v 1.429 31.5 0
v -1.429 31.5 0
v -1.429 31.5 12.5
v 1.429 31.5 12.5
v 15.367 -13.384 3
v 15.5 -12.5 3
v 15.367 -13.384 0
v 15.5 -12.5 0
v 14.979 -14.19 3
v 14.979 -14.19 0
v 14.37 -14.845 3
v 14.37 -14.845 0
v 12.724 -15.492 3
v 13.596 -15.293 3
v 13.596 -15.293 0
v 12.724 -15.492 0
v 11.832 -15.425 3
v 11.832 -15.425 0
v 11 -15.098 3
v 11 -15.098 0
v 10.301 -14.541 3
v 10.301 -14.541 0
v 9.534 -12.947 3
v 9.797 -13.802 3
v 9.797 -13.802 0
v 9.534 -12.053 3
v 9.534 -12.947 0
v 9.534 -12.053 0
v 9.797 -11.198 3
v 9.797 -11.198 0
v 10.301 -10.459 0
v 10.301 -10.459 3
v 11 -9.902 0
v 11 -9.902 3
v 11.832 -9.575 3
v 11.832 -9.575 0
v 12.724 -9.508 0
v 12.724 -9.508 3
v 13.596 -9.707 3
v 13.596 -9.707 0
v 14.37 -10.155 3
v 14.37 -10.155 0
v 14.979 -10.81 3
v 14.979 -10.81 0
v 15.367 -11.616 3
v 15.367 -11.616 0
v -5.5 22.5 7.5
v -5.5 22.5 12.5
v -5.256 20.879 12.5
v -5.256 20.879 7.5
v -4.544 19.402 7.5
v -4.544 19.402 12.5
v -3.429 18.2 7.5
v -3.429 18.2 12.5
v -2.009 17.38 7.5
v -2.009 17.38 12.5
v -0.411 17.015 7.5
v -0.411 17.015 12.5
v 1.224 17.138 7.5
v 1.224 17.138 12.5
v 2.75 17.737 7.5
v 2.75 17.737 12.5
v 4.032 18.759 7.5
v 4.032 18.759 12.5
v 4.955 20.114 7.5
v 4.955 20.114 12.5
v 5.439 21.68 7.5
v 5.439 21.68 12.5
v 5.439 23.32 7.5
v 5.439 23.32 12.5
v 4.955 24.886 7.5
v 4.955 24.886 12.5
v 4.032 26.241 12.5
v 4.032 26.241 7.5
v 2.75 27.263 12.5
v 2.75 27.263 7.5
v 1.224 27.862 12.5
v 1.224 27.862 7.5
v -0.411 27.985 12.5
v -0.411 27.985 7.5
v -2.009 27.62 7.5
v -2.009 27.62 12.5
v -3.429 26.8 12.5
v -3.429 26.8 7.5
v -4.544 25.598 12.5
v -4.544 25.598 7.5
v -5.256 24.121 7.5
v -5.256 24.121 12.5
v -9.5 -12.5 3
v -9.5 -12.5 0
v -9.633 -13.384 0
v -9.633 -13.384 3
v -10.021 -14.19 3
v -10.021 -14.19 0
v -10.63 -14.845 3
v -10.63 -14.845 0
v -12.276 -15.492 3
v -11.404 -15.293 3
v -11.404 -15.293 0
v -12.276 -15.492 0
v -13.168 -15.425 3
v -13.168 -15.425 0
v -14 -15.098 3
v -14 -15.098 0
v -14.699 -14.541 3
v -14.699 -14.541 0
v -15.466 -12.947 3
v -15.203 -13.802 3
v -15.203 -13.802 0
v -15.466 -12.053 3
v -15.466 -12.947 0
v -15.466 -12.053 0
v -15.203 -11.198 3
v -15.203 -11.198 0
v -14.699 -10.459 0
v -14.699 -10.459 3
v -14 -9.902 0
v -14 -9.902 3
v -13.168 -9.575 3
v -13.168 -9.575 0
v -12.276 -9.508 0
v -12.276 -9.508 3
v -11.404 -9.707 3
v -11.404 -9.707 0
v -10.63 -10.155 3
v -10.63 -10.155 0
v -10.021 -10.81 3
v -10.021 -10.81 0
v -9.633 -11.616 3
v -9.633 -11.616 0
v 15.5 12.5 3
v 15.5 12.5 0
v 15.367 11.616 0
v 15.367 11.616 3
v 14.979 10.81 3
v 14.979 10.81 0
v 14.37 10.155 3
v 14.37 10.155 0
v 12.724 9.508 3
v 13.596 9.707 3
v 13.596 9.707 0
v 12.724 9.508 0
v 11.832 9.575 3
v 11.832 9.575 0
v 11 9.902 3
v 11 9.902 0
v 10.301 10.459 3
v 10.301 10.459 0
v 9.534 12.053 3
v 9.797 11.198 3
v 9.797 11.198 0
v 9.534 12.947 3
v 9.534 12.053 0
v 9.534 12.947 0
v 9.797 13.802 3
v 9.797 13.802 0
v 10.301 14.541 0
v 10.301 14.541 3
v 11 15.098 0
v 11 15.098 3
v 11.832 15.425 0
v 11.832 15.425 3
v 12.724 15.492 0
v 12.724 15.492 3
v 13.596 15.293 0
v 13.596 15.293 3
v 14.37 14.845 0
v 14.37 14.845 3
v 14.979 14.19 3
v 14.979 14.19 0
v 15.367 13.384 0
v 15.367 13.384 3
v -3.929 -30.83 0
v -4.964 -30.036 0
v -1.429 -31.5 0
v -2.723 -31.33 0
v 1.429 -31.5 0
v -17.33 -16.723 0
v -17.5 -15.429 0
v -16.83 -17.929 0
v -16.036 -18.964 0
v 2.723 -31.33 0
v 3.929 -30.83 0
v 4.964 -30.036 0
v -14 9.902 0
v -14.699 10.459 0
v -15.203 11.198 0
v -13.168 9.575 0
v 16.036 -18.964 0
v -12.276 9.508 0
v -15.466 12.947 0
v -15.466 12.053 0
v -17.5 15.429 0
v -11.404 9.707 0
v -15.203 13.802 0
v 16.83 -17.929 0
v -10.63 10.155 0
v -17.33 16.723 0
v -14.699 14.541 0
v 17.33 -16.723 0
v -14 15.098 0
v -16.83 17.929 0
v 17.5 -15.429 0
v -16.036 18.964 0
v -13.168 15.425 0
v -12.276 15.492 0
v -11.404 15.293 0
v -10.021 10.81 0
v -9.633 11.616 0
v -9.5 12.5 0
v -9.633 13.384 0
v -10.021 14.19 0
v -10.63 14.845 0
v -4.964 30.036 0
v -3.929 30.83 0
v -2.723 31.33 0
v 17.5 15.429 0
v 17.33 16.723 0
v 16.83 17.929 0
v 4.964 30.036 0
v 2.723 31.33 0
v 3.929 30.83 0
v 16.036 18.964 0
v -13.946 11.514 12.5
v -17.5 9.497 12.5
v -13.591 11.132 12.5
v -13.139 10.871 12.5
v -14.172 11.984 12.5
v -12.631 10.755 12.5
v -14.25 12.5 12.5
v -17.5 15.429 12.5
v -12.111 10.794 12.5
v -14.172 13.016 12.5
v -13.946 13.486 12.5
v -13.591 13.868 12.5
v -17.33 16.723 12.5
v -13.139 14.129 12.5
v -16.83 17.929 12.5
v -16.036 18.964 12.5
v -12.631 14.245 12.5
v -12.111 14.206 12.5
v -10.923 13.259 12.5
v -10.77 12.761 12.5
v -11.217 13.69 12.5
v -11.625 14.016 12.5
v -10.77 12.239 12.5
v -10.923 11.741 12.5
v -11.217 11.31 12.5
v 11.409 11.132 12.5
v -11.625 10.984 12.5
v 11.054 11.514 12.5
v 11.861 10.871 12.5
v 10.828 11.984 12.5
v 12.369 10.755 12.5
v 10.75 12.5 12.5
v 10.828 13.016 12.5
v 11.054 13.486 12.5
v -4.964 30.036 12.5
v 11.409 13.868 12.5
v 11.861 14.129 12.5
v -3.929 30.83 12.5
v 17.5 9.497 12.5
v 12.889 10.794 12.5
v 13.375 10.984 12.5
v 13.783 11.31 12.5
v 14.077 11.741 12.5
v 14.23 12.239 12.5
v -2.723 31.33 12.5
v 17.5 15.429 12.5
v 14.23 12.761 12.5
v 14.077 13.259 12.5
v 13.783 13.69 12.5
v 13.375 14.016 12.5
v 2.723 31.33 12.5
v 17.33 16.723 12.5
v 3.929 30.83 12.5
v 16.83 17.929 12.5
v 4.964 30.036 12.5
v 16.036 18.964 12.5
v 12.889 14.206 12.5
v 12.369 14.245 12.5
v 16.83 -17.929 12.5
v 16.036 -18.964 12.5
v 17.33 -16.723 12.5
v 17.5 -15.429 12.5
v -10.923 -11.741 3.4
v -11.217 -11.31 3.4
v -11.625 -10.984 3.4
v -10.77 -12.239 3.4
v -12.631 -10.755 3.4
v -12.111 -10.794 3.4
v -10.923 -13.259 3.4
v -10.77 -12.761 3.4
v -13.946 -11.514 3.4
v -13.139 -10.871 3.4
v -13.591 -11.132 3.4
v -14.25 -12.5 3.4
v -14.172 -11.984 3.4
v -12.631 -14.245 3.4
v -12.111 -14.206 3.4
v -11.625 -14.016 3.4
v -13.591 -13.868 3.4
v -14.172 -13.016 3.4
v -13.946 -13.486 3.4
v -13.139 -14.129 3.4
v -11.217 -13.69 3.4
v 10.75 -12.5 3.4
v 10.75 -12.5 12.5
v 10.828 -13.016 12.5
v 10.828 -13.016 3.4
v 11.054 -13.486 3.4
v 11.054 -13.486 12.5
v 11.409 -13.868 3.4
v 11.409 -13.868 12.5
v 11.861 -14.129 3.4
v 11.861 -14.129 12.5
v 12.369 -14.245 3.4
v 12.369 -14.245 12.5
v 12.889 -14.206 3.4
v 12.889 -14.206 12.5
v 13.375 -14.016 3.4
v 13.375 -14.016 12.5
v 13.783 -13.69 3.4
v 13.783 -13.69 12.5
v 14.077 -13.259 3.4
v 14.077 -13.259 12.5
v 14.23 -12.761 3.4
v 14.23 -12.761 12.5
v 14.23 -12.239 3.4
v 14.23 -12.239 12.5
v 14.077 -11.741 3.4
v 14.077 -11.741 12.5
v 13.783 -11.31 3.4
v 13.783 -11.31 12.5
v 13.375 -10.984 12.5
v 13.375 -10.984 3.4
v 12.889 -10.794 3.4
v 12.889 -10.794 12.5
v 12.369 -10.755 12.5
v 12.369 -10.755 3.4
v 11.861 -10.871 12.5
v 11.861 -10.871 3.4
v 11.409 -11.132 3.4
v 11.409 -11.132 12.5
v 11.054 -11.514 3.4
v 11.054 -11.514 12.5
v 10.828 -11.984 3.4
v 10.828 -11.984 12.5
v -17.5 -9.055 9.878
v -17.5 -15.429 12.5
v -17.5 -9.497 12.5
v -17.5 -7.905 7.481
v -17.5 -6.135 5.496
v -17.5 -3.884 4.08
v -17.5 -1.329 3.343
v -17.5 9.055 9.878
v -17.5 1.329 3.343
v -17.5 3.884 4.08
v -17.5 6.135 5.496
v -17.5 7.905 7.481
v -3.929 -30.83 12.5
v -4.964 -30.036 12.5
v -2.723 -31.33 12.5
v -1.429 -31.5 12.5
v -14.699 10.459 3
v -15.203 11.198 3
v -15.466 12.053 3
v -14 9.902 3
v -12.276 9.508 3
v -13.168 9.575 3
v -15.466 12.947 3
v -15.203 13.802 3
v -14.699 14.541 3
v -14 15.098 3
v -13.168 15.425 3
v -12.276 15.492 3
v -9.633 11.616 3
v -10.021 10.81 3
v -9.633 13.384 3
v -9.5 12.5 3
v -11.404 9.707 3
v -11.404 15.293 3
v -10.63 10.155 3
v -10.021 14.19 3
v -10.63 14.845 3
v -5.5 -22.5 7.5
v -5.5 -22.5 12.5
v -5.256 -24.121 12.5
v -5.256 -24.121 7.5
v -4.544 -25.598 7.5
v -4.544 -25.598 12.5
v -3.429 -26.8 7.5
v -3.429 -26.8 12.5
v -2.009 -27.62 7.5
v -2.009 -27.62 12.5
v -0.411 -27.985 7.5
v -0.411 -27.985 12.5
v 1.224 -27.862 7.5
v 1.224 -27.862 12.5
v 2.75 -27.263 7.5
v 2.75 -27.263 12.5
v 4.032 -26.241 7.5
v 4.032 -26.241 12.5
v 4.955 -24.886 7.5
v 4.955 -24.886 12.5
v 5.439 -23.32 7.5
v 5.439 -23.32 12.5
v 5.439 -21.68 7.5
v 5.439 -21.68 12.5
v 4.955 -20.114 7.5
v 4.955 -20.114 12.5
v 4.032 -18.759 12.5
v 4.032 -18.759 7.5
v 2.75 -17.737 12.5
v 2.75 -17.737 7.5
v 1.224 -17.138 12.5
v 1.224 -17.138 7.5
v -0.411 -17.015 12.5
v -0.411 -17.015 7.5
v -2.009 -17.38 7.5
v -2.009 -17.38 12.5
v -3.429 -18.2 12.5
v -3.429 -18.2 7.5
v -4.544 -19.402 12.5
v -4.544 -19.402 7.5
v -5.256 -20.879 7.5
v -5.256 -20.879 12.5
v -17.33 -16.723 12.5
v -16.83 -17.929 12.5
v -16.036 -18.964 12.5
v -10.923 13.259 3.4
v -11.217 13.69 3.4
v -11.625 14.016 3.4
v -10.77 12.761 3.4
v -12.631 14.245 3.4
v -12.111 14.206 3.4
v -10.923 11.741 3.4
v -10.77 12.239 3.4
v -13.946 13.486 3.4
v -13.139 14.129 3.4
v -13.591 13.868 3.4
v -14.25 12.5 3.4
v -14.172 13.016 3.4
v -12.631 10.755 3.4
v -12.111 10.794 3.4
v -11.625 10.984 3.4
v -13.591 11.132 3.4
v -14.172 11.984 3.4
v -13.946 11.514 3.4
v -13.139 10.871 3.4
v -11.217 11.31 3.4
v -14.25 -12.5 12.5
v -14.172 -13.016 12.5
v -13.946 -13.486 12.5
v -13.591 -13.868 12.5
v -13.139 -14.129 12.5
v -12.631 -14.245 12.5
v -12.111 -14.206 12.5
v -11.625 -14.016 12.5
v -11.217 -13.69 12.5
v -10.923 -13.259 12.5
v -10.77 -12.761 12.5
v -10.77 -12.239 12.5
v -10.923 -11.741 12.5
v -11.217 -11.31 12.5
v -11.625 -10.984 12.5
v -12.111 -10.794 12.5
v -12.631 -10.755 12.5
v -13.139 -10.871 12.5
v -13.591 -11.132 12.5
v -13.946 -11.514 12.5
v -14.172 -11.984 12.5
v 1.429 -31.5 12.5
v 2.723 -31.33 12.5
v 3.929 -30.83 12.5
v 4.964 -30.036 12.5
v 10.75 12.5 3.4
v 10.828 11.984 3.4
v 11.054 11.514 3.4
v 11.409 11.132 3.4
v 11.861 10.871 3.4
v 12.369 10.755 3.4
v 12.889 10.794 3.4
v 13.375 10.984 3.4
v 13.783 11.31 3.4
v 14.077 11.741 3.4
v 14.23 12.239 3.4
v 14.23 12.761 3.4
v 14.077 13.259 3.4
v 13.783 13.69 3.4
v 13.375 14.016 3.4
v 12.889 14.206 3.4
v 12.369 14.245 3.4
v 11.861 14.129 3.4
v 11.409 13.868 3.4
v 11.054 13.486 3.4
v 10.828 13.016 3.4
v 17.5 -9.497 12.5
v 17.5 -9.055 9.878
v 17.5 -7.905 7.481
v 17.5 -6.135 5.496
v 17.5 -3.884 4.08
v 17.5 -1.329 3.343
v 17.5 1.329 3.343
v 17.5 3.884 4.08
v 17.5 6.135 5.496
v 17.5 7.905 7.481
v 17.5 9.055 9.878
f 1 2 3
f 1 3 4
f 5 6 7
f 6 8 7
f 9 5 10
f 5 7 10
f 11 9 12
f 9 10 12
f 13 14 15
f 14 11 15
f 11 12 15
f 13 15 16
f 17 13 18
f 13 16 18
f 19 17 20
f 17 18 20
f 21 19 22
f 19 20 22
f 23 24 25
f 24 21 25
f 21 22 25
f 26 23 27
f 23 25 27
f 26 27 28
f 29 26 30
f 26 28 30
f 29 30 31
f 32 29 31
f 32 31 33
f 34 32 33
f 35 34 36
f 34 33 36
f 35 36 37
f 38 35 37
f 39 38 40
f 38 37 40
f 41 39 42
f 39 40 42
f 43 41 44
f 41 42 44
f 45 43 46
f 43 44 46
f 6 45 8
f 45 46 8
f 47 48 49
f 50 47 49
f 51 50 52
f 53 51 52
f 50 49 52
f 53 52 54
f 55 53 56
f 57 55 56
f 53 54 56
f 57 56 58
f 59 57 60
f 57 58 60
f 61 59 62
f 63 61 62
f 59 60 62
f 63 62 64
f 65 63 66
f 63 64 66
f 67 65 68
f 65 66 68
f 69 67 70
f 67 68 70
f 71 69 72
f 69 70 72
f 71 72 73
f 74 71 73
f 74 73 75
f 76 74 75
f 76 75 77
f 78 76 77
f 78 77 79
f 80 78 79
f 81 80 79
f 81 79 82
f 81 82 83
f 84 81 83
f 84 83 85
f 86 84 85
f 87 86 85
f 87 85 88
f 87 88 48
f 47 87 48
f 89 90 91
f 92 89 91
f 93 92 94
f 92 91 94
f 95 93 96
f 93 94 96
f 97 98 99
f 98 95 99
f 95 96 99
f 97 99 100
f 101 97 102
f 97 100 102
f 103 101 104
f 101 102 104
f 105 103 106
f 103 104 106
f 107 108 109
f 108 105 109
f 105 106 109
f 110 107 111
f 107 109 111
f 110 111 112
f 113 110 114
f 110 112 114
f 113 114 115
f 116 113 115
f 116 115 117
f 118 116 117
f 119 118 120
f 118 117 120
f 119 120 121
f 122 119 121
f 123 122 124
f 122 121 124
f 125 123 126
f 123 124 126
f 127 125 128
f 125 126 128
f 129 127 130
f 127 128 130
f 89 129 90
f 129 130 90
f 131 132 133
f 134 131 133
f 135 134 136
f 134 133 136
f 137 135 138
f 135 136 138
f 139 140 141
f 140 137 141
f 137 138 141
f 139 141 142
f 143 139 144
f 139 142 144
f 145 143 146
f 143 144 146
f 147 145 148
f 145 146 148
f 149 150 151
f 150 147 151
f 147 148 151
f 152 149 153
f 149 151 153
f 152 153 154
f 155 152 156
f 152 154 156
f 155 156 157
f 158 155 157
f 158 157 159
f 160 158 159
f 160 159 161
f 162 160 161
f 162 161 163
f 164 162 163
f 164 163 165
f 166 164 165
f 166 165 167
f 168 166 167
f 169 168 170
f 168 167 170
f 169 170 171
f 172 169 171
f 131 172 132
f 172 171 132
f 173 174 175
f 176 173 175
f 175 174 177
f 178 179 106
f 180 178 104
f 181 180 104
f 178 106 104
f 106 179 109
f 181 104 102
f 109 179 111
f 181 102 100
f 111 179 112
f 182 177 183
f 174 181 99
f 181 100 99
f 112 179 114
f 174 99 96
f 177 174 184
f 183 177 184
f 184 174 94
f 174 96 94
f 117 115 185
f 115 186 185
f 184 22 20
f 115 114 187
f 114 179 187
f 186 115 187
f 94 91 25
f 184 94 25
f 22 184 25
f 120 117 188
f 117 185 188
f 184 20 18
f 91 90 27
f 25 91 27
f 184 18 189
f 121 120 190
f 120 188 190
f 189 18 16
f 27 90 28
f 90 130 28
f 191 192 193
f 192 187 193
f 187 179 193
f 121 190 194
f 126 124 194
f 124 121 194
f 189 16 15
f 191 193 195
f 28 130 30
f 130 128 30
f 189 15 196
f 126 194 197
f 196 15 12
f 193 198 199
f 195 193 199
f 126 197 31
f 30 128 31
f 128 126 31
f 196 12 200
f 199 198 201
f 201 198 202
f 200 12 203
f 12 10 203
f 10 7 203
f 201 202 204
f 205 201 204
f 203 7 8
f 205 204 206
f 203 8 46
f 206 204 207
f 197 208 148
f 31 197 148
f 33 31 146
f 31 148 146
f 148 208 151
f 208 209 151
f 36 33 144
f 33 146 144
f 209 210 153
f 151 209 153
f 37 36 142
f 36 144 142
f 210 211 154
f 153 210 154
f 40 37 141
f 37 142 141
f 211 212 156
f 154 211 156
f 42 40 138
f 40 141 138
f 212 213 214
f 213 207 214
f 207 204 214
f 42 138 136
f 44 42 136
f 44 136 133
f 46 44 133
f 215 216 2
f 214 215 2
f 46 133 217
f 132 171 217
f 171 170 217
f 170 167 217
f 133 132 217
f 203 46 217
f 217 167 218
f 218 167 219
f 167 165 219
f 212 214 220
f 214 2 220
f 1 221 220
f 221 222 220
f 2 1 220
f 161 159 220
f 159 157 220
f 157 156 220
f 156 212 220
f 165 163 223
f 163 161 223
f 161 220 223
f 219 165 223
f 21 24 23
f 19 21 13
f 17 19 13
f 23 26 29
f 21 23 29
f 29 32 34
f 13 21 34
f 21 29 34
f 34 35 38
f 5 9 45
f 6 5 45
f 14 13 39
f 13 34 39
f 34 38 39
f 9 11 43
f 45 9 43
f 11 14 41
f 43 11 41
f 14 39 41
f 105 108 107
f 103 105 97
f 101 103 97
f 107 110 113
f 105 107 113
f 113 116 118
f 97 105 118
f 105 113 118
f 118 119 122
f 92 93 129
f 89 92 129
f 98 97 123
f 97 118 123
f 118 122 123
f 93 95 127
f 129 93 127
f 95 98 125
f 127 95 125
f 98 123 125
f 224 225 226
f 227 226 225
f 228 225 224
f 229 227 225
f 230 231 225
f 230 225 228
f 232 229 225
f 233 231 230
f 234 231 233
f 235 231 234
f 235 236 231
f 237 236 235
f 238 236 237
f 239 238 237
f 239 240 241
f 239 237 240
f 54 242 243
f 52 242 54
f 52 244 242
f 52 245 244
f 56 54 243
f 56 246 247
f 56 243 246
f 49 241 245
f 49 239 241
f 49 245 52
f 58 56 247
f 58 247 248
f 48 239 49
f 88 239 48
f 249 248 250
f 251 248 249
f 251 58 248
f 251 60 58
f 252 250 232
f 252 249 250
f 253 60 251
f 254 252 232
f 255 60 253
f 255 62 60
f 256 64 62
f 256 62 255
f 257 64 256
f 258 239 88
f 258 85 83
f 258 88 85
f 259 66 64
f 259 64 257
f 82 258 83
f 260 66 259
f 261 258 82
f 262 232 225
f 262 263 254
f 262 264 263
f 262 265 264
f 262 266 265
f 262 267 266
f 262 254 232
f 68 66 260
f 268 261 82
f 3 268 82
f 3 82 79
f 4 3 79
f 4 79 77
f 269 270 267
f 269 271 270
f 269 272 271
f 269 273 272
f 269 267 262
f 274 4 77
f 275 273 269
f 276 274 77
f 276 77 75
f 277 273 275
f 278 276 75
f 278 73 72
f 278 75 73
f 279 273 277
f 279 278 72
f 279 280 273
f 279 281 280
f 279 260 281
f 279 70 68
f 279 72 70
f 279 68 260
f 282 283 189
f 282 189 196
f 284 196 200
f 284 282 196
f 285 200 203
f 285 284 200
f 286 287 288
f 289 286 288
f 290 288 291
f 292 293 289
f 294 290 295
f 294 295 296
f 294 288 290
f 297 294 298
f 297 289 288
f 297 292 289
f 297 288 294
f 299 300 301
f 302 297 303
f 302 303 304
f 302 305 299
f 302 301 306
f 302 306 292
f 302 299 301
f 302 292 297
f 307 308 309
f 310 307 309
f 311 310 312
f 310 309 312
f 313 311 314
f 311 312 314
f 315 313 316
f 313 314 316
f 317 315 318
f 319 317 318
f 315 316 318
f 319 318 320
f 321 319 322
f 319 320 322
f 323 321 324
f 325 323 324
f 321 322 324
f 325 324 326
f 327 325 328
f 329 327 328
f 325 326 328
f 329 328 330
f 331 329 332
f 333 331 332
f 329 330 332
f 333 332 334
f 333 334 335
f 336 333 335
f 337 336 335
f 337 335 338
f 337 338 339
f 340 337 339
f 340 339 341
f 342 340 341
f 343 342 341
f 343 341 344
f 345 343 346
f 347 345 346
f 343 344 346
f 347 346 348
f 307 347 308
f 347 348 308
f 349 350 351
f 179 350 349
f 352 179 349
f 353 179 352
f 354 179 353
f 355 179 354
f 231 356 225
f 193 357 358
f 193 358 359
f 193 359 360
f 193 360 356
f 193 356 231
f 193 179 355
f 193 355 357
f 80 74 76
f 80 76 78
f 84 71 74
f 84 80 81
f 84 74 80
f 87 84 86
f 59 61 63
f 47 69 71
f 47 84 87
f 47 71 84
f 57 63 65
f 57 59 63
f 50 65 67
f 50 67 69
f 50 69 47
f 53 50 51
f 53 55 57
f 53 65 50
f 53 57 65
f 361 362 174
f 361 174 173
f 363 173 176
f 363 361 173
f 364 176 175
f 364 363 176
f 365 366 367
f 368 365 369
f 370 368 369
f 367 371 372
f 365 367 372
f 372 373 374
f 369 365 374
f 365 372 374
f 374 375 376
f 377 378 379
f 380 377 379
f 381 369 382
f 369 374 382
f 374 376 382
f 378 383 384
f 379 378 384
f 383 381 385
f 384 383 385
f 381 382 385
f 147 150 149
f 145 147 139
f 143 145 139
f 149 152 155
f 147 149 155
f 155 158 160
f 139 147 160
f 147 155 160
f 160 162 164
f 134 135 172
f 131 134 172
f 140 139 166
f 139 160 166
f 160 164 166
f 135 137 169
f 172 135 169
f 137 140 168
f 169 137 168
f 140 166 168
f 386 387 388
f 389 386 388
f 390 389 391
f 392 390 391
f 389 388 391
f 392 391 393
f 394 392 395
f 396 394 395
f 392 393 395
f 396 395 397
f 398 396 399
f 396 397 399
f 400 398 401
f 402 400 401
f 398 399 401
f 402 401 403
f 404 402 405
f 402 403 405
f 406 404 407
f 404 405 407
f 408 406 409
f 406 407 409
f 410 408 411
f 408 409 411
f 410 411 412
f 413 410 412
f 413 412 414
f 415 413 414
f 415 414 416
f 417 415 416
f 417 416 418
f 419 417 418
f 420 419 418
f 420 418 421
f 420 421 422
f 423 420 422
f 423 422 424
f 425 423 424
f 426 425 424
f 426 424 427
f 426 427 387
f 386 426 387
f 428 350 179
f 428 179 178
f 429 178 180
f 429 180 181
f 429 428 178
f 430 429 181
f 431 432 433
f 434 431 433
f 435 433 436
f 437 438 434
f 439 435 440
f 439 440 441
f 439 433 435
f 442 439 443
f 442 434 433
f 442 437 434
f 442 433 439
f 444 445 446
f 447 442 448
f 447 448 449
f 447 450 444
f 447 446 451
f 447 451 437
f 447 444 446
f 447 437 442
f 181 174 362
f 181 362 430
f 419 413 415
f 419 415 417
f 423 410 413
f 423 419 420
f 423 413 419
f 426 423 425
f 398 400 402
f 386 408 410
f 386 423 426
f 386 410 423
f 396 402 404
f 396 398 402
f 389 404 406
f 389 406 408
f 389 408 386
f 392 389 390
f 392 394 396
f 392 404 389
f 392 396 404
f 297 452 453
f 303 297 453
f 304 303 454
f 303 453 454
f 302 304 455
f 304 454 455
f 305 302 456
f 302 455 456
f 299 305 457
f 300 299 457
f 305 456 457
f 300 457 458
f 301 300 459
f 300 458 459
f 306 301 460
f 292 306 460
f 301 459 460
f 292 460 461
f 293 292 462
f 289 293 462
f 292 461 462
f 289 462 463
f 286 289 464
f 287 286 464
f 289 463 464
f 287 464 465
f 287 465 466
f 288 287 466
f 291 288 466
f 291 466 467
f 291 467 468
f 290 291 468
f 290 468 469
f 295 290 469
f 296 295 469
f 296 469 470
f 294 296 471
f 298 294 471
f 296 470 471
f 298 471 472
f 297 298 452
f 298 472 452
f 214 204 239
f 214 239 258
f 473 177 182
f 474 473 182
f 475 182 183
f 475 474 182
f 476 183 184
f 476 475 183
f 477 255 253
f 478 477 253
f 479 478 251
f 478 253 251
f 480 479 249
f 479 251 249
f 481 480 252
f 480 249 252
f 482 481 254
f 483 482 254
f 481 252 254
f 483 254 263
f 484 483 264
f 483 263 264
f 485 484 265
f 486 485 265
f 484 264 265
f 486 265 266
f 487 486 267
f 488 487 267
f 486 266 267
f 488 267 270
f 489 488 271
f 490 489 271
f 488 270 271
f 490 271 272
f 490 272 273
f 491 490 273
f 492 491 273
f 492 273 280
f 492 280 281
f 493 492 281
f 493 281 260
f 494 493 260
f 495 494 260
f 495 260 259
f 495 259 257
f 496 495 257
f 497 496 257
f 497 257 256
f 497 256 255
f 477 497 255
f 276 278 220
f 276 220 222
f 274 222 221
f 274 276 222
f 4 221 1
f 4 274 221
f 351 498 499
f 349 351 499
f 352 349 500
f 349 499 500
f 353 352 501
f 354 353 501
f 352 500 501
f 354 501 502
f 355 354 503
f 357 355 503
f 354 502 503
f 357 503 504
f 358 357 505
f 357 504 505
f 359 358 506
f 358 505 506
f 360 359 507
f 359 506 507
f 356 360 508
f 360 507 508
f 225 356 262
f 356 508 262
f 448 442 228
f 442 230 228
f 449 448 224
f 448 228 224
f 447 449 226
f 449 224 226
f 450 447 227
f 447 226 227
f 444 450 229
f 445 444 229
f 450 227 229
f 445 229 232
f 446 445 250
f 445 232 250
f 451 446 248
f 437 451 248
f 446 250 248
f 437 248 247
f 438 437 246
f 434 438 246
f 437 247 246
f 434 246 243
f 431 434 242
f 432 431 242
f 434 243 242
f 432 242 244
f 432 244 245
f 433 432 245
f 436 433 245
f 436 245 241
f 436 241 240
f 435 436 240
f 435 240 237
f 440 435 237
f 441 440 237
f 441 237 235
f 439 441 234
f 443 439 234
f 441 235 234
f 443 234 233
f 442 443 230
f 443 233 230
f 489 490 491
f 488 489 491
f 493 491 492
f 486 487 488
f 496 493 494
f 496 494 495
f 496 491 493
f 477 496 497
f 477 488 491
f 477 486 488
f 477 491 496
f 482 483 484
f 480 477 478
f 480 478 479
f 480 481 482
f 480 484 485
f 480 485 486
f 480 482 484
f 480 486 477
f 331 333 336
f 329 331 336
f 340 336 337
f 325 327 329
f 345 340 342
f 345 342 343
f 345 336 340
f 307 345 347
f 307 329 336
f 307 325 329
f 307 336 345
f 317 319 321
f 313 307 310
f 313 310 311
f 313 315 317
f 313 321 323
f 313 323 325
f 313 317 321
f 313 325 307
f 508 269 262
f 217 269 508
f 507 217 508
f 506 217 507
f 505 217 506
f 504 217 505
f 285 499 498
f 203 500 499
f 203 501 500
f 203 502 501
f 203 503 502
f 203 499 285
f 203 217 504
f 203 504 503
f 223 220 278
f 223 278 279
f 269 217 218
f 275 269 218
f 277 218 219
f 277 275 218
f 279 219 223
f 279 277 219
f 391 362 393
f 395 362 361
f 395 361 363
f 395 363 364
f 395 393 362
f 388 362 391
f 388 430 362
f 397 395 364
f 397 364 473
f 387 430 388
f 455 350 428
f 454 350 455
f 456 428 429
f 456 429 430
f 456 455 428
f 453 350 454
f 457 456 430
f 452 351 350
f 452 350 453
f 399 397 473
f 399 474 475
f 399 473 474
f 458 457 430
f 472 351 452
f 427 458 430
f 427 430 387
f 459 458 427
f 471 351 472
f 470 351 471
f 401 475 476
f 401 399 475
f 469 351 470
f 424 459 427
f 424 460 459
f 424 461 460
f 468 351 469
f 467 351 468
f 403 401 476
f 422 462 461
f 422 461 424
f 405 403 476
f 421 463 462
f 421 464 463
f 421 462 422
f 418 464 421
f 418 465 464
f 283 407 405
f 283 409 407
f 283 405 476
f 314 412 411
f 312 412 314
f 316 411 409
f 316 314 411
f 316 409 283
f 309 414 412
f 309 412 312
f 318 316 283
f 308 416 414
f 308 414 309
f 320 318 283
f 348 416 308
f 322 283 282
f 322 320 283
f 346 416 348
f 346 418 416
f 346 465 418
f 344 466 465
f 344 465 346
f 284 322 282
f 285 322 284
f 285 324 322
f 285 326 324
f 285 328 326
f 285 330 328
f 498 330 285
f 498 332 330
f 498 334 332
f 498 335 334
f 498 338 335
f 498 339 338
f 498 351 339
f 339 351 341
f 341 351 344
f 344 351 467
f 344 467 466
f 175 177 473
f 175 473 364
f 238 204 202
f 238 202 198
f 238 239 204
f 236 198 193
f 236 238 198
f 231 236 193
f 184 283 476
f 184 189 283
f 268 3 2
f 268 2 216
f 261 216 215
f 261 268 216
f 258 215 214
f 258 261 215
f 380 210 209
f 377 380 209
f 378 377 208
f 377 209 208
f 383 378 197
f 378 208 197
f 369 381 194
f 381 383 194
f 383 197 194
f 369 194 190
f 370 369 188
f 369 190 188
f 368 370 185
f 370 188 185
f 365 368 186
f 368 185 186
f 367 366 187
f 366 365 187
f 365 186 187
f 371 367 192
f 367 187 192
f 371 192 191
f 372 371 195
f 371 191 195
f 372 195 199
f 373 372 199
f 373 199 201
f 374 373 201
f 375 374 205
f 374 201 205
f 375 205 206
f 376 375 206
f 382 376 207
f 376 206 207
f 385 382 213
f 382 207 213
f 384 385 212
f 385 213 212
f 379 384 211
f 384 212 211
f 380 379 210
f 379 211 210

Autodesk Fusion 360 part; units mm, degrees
sketch "スケッチ1" plane through (0, 0, 0) normal (0, 0, 1) x (1, 0, 0)
  line L0 (-3.5, 31.5) -> (3.5, 31.5)
  line L1 (3.5, 31.5) -> (17.5, 17.5)
  line L2 (17.5, 17.5) -> (17.5, -17.5)
  line L3 (17.5, -17.5) -> (3.5, -31.5)
  line L4 (3.5, -31.5) -> (-3.5, -31.5)
  line L5 (-3.5, -31.5) -> (-17.5, -17.5)
  line L6 (-17.5, -17.5) -> (-17.5, 17.5)
  line L7 (-17.5, 17.5) -> (-3.5, 31.5)
  circle A0 centre (-12.5, 12.5) radius 3
  circle A1 centre (-12.5, -12.5) radius 3
  circle A2 centre (12.5, -12.5) radius 3
  circle A3 centre (12.5, 12.5) radius 3
  dimension "d1" = 35
  dimension "d2" = 63
  dimension "d3" = 31.5
  dimension "d4" = 17.5
  dimension "d5" = 14
  dimension "d6" = 14
  dimension "d7" = 14
  dimension "d8" = 14
  dimension "d9" = 14
  dimension "d10" = 14
  dimension "d11" = 14
  dimension "d12" = 14
  dimension "d13" = 6
  dimension "d14" = 12.5
  dimension "d15" = 12.5
  dimension "d17" = 360
extrude "押し出し1" add sketch "スケッチ1" along normal blind 12.5 contours L0 L1 L2 L3 L4 L5 L6 L7 | A0 | A1 | A2 | A3
extrude "押し出し2" cut sketch "スケッチ1" along normal blind 3 contours A0 | A1 | A2 | A3
sketch "スケッチ2" plane through (17.5, 0, 0) normal (1, 0, 0) x (0, 1, 0)
  line L0 (-17.5, 0) -> (17.5, 0)
  line L1 (17.5, 0) -> (17.5, 12.5)
  line L2 (17.5, 12.5) -> (-17.5, 12.5)
  line L3 (-17.5, 12.5) -> (-17.5, 0)
  circle A0 centre (0, 12.75) radius 9.5
  line L4 (17.5, 0) -> (-17.5, 0)
  dimension "d22" = 19
  dimension "d23" = 12.75
extrude "押し出し3" cut sketch "スケッチ2" against normal up to surface (35 mm away) contours L2 A0 picked at (1.5592, 9.8271)
sketch "スケッチ3" plane through (0, 0, 12.5) normal (0, 0, 1) x (-1, 0, 0)
  line L0 (17.5, -9.4967) -> (-17.5, -9.4967)
  line L1 (-17.5, -9.4967) -> (-17.5, -17.5)
  line L2 (-17.5, -17.5) -> (-3.5, -31.5)
  line L3 (-3.5, -31.5) -> (3.5, -31.5)
  line L4 (3.5, -31.5) -> (17.5, -17.5)
  line L5 (17.5, -17.5) -> (17.5, -9.4967)
  circle A0 centre (12.5, -12.5) radius 1.75
  circle A1 centre (12.5, 12.5) radius 1.75
  circle A2 centre (-12.5, 12.5) radius 1.75
  circle A3 centre (-12.5, -12.5) radius 1.75
  line L6 (-3.5, 31.5) -> (3.5, 31.5)
  line L7 (0, 31.5) -> (0, -31.5) construction
  circle A4 centre (0, 22.5) radius 5.5
  circle A5 centre (0, -22.5) radius 5.5
  point P0 (12.5, -12.5)
  dimension "d26" = 3.5
  dimension "d28" = 360
  dimension "d32" = 11
  dimension "d33" = 11
  dimension "d34" = 9
  dimension "d35" = 9
extrude "押し出し4" cut sketch "スケッチ3" against normal blind 9.1 contours A0 | A1 | A2 | A3
extrude "押し出し5" cut sketch "スケッチ3" against normal blind 5 contours A4 | A5
fillet "フィレット1" radius 5 8 edges at (-17.5, 17.5, 6.25) (-3.5, 31.5, 6.25) (3.5, 31.5, 6.25) (17.5, 17.5, 6.25) (-17.5, -17.5, 6.25) (-3.5, -31.5, 6.25) (3.5, -31.5, 6.25) (17.5, -17.5, 6.25)
equation "d3 = d2 / 2"
equation "d4 = d1 / 2"
equation "d7 = d5"
equation "d8 = d6"
equation "d9 = d5"
equation "d10 = d7"
equation "d11 = d10"
equation "d12 = d9"
